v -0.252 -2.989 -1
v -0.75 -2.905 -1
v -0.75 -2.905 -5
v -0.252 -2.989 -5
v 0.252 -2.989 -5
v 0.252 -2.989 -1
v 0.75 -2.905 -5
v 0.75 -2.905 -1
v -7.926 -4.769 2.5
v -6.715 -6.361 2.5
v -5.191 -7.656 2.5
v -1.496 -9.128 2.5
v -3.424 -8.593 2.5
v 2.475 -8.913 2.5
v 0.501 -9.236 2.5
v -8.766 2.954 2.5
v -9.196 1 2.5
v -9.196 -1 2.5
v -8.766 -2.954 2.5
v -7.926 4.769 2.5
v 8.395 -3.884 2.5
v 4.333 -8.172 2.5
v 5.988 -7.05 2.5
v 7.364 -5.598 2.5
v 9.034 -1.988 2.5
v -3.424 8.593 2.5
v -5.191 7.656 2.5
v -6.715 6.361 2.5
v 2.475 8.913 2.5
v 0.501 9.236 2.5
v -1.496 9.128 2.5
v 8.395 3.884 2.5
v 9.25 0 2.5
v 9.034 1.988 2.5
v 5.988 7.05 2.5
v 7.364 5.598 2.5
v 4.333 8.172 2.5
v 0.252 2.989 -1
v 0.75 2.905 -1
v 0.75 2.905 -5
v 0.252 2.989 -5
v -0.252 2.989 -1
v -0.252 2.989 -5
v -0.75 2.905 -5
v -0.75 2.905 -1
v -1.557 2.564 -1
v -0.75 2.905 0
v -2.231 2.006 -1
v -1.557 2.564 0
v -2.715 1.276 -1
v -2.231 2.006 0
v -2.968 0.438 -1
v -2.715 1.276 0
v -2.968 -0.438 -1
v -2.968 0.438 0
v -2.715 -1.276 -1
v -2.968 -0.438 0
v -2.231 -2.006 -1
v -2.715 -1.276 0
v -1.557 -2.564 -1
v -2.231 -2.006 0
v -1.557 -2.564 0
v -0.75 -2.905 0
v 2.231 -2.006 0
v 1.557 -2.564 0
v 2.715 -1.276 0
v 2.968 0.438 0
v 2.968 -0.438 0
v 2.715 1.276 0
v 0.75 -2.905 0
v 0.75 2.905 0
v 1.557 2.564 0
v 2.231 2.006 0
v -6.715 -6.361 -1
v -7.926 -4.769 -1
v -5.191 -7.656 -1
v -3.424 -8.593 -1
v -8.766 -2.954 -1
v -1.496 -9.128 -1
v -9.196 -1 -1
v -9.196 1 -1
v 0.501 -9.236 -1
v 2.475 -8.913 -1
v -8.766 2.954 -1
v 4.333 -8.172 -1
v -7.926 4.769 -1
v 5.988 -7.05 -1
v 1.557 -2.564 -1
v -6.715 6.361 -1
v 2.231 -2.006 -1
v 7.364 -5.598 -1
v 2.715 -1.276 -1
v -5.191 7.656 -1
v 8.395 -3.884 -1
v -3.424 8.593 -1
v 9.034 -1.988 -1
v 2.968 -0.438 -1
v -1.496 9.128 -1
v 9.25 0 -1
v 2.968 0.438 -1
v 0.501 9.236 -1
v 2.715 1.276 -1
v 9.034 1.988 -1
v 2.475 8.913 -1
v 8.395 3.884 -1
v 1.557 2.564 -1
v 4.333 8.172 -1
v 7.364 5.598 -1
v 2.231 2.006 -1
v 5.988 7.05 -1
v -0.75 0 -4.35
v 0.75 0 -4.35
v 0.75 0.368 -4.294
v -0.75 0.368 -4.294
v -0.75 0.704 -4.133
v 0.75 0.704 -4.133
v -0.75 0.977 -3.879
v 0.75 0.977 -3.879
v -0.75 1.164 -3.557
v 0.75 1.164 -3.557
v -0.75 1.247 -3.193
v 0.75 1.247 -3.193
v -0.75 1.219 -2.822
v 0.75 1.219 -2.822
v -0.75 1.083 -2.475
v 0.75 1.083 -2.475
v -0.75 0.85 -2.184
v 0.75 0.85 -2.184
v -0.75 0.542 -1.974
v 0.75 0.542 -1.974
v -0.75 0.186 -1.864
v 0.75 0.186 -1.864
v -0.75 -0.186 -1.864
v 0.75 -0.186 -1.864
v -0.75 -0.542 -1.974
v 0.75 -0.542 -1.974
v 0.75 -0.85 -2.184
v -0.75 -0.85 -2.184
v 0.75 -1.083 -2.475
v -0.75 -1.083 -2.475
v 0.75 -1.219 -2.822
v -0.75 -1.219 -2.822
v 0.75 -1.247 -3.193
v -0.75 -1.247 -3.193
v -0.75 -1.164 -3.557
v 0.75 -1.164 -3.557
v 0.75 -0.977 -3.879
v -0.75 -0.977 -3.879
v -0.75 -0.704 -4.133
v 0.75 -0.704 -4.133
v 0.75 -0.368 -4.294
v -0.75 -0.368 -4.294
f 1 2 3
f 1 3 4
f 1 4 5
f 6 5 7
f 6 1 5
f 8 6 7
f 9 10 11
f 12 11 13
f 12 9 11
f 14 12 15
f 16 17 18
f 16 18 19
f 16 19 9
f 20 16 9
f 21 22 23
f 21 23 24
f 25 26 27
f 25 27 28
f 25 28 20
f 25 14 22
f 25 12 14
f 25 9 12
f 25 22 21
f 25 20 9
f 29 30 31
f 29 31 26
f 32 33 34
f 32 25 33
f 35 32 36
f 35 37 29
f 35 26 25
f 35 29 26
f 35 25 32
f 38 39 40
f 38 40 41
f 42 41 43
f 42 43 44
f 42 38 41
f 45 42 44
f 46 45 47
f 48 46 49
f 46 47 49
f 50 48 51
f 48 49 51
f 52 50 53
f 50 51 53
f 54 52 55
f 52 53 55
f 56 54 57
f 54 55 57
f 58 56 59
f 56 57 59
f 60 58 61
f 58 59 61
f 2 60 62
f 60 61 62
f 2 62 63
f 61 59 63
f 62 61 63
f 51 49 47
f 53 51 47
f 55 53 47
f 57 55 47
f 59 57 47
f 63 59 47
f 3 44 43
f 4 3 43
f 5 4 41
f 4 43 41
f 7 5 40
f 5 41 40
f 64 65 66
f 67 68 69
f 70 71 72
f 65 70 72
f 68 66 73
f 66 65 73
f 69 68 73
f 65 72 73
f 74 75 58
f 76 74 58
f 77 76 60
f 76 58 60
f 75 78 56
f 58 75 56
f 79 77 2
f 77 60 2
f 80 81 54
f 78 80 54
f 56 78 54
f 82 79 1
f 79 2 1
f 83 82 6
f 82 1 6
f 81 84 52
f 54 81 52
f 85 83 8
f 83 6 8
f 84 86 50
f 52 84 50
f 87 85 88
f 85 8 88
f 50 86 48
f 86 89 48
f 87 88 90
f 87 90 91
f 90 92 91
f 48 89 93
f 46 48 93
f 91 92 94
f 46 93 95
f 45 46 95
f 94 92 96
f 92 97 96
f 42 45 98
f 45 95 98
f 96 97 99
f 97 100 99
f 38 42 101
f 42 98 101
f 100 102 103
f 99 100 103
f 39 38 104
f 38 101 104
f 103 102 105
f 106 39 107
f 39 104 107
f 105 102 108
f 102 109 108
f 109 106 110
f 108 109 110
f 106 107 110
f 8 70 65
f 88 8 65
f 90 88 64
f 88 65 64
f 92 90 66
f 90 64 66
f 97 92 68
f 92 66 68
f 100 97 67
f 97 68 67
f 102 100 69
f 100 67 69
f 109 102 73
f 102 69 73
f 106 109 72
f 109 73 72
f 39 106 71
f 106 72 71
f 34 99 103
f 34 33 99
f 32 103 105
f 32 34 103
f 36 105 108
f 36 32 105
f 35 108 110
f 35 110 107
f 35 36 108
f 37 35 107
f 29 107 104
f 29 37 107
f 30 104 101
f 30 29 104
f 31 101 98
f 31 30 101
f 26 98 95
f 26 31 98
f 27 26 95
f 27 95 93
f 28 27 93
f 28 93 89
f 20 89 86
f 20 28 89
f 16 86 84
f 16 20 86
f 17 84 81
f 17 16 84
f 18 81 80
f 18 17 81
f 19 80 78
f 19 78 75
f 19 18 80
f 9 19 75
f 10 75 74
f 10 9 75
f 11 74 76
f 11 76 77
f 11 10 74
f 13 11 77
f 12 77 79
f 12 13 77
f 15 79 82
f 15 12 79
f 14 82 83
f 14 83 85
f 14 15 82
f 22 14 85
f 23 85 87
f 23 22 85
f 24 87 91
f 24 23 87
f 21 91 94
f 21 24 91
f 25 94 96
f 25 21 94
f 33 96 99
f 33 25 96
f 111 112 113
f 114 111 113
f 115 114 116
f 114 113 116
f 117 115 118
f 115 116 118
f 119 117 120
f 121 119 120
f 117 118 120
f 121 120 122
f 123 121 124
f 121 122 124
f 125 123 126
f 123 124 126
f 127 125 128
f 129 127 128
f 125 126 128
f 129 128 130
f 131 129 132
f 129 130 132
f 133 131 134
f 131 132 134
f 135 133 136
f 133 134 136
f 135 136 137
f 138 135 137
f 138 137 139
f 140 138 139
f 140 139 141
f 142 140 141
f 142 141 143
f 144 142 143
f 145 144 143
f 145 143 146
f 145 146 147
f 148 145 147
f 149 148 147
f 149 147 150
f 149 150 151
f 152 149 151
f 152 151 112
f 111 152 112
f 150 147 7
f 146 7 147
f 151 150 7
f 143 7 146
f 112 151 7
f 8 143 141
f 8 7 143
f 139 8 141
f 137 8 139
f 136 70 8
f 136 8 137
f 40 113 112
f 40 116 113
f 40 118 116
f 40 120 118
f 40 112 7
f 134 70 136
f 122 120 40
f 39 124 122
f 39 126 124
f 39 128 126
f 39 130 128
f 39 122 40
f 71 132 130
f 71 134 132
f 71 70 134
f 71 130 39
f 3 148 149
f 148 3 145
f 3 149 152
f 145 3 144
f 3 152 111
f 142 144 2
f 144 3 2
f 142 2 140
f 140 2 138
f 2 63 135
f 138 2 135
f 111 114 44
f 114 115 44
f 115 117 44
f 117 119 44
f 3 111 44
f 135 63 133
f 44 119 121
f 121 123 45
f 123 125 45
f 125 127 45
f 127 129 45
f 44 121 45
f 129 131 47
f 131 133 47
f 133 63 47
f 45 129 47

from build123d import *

# Parameters (mm, degrees)
CROQUIS1_R              = 9.25
CROQUIS1_R_2            = 3
CROQUIS1_W              = 1.5
CROQUIS1_H              = 5.80947502
SALIENTE_EXTRUIR1_DEPTH = 2.5
CROQUIS1_4_W            = 1.5
CROQUIS1_4_H            = 5.80947502
SALIENTE_EXTRUIR2_DEPTH = 5
CROQUIS1_5_R            = 9.25
CROQUIS1_5_R_2          = 3
SALIENTE_EXTRUIR3_DEPTH = 1
CORTAR_EXTRUIR1_REACH   = 16.511
CROQUIS2_R              = 1.25


with BuildPart() as part:
    # Croquis1 → Saliente-Extruir1 (new body)
    # profile 1 of 6: a face of its own
    with BuildSketch(Plane.XY):
        Circle(CROQUIS1_R)
        Circle(CROQUIS1_R_2, mode=Mode.SUBTRACT)
    # profile 2 of 6: a face of its own
    with BuildSketch(Plane.XY):
        with BuildLine():
            Line((-0.75, -2.90473751), (-0.75, 2.90473751))
            ThreePointArc((-0.75, 2.90473751), (-3, 0), (-0.75, -2.90473751))
        make_face()
    # profile 3 of 6: a face of its own
    with BuildSketch(Plane.XY):
        with BuildLine():
            ThreePointArc((3, 0), (2.371708245, 1.837117307), (0.75, 2.90473751))
            Line((0.75, 2.90473751), (0.75, -2.90473751))
            ThreePointArc((0.75, -2.90473751), (2.371708245, -1.837117307), (3, 0))
        make_face()
    # profile 4 of 6: a face of its own
    with BuildSketch(Plane.XY):
        Rectangle(CROQUIS1_W, CROQUIS1_H)
    # profile 5 of 6: a face of its own
    with BuildSketch(Plane.XY):
        with BuildLine():
            Line((0.75, -2.90473751), (-0.75, -2.90473751))
            ThreePointArc((-0.75, -2.90473751), (0, -3), (0.75, -2.90473751))
        make_face()
    # profile 6 of 6: a face of its own
    with BuildSketch(Plane.XY):
        with BuildLine():
            ThreePointArc((0.75, 2.90473751), (0, 3), (-0.75, 2.90473751))
            Line((-0.75, 2.90473751), (0.75, 2.90473751))
        make_face()
    extrude(amount=SALIENTE_EXTRUIR1_DEPTH)

    # Croquis1<4> → Saliente-Extruir2 (add)
    with BuildSketch(Plane.XY):
        Rectangle(CROQUIS1_4_W, CROQUIS1_4_H)
        with BuildLine():
            ThreePointArc((0.75, 2.90473751), (0, 3), (-0.75, 2.90473751))
            Line((-0.75, 2.90473751), (0.75, 2.90473751))
        make_face()
        with BuildLine():
            Line((0.75, -2.90473751), (-0.75, -2.90473751))
            ThreePointArc((-0.75, -2.90473751), (0, -3), (0.75, -2.90473751))
        make_face()
    extrude(amount=-SALIENTE_EXTRUIR2_DEPTH)

    # Croquis1<5> → Saliente-Extruir3 (add)
    with BuildSketch(Plane.XY):
        Circle(CROQUIS1_5_R)
        Circle(CROQUIS1_5_R_2, mode=Mode.SUBTRACT)
    extrude(amount=-SALIENTE_EXTRUIR3_DEPTH)

    # Croquis2 → Cortar-Extruir1 (cut, up to next)
    with BuildSketch(Plane(origin=(0.75, 0, 0), x_dir=(0, 0, -1), z_dir=(1, 0, 0)), mode=Mode.PRIVATE) as cortar_extruir1_sk1:
        with Locations((3.1, 0)):
            Circle(CROQUIS2_R)
    cortar_extruir1_tool1 = extrude(cortar_extruir1_sk1.sketch, amount=-CORTAR_EXTRUIR1_REACH, mode=Mode.PRIVATE) & part.part
    add(cortar_extruir1_tool1.solids().sort_by_distance((0.75, 0, -3.1))[0], mode=Mode.SUBTRACT)


solid = part.part
